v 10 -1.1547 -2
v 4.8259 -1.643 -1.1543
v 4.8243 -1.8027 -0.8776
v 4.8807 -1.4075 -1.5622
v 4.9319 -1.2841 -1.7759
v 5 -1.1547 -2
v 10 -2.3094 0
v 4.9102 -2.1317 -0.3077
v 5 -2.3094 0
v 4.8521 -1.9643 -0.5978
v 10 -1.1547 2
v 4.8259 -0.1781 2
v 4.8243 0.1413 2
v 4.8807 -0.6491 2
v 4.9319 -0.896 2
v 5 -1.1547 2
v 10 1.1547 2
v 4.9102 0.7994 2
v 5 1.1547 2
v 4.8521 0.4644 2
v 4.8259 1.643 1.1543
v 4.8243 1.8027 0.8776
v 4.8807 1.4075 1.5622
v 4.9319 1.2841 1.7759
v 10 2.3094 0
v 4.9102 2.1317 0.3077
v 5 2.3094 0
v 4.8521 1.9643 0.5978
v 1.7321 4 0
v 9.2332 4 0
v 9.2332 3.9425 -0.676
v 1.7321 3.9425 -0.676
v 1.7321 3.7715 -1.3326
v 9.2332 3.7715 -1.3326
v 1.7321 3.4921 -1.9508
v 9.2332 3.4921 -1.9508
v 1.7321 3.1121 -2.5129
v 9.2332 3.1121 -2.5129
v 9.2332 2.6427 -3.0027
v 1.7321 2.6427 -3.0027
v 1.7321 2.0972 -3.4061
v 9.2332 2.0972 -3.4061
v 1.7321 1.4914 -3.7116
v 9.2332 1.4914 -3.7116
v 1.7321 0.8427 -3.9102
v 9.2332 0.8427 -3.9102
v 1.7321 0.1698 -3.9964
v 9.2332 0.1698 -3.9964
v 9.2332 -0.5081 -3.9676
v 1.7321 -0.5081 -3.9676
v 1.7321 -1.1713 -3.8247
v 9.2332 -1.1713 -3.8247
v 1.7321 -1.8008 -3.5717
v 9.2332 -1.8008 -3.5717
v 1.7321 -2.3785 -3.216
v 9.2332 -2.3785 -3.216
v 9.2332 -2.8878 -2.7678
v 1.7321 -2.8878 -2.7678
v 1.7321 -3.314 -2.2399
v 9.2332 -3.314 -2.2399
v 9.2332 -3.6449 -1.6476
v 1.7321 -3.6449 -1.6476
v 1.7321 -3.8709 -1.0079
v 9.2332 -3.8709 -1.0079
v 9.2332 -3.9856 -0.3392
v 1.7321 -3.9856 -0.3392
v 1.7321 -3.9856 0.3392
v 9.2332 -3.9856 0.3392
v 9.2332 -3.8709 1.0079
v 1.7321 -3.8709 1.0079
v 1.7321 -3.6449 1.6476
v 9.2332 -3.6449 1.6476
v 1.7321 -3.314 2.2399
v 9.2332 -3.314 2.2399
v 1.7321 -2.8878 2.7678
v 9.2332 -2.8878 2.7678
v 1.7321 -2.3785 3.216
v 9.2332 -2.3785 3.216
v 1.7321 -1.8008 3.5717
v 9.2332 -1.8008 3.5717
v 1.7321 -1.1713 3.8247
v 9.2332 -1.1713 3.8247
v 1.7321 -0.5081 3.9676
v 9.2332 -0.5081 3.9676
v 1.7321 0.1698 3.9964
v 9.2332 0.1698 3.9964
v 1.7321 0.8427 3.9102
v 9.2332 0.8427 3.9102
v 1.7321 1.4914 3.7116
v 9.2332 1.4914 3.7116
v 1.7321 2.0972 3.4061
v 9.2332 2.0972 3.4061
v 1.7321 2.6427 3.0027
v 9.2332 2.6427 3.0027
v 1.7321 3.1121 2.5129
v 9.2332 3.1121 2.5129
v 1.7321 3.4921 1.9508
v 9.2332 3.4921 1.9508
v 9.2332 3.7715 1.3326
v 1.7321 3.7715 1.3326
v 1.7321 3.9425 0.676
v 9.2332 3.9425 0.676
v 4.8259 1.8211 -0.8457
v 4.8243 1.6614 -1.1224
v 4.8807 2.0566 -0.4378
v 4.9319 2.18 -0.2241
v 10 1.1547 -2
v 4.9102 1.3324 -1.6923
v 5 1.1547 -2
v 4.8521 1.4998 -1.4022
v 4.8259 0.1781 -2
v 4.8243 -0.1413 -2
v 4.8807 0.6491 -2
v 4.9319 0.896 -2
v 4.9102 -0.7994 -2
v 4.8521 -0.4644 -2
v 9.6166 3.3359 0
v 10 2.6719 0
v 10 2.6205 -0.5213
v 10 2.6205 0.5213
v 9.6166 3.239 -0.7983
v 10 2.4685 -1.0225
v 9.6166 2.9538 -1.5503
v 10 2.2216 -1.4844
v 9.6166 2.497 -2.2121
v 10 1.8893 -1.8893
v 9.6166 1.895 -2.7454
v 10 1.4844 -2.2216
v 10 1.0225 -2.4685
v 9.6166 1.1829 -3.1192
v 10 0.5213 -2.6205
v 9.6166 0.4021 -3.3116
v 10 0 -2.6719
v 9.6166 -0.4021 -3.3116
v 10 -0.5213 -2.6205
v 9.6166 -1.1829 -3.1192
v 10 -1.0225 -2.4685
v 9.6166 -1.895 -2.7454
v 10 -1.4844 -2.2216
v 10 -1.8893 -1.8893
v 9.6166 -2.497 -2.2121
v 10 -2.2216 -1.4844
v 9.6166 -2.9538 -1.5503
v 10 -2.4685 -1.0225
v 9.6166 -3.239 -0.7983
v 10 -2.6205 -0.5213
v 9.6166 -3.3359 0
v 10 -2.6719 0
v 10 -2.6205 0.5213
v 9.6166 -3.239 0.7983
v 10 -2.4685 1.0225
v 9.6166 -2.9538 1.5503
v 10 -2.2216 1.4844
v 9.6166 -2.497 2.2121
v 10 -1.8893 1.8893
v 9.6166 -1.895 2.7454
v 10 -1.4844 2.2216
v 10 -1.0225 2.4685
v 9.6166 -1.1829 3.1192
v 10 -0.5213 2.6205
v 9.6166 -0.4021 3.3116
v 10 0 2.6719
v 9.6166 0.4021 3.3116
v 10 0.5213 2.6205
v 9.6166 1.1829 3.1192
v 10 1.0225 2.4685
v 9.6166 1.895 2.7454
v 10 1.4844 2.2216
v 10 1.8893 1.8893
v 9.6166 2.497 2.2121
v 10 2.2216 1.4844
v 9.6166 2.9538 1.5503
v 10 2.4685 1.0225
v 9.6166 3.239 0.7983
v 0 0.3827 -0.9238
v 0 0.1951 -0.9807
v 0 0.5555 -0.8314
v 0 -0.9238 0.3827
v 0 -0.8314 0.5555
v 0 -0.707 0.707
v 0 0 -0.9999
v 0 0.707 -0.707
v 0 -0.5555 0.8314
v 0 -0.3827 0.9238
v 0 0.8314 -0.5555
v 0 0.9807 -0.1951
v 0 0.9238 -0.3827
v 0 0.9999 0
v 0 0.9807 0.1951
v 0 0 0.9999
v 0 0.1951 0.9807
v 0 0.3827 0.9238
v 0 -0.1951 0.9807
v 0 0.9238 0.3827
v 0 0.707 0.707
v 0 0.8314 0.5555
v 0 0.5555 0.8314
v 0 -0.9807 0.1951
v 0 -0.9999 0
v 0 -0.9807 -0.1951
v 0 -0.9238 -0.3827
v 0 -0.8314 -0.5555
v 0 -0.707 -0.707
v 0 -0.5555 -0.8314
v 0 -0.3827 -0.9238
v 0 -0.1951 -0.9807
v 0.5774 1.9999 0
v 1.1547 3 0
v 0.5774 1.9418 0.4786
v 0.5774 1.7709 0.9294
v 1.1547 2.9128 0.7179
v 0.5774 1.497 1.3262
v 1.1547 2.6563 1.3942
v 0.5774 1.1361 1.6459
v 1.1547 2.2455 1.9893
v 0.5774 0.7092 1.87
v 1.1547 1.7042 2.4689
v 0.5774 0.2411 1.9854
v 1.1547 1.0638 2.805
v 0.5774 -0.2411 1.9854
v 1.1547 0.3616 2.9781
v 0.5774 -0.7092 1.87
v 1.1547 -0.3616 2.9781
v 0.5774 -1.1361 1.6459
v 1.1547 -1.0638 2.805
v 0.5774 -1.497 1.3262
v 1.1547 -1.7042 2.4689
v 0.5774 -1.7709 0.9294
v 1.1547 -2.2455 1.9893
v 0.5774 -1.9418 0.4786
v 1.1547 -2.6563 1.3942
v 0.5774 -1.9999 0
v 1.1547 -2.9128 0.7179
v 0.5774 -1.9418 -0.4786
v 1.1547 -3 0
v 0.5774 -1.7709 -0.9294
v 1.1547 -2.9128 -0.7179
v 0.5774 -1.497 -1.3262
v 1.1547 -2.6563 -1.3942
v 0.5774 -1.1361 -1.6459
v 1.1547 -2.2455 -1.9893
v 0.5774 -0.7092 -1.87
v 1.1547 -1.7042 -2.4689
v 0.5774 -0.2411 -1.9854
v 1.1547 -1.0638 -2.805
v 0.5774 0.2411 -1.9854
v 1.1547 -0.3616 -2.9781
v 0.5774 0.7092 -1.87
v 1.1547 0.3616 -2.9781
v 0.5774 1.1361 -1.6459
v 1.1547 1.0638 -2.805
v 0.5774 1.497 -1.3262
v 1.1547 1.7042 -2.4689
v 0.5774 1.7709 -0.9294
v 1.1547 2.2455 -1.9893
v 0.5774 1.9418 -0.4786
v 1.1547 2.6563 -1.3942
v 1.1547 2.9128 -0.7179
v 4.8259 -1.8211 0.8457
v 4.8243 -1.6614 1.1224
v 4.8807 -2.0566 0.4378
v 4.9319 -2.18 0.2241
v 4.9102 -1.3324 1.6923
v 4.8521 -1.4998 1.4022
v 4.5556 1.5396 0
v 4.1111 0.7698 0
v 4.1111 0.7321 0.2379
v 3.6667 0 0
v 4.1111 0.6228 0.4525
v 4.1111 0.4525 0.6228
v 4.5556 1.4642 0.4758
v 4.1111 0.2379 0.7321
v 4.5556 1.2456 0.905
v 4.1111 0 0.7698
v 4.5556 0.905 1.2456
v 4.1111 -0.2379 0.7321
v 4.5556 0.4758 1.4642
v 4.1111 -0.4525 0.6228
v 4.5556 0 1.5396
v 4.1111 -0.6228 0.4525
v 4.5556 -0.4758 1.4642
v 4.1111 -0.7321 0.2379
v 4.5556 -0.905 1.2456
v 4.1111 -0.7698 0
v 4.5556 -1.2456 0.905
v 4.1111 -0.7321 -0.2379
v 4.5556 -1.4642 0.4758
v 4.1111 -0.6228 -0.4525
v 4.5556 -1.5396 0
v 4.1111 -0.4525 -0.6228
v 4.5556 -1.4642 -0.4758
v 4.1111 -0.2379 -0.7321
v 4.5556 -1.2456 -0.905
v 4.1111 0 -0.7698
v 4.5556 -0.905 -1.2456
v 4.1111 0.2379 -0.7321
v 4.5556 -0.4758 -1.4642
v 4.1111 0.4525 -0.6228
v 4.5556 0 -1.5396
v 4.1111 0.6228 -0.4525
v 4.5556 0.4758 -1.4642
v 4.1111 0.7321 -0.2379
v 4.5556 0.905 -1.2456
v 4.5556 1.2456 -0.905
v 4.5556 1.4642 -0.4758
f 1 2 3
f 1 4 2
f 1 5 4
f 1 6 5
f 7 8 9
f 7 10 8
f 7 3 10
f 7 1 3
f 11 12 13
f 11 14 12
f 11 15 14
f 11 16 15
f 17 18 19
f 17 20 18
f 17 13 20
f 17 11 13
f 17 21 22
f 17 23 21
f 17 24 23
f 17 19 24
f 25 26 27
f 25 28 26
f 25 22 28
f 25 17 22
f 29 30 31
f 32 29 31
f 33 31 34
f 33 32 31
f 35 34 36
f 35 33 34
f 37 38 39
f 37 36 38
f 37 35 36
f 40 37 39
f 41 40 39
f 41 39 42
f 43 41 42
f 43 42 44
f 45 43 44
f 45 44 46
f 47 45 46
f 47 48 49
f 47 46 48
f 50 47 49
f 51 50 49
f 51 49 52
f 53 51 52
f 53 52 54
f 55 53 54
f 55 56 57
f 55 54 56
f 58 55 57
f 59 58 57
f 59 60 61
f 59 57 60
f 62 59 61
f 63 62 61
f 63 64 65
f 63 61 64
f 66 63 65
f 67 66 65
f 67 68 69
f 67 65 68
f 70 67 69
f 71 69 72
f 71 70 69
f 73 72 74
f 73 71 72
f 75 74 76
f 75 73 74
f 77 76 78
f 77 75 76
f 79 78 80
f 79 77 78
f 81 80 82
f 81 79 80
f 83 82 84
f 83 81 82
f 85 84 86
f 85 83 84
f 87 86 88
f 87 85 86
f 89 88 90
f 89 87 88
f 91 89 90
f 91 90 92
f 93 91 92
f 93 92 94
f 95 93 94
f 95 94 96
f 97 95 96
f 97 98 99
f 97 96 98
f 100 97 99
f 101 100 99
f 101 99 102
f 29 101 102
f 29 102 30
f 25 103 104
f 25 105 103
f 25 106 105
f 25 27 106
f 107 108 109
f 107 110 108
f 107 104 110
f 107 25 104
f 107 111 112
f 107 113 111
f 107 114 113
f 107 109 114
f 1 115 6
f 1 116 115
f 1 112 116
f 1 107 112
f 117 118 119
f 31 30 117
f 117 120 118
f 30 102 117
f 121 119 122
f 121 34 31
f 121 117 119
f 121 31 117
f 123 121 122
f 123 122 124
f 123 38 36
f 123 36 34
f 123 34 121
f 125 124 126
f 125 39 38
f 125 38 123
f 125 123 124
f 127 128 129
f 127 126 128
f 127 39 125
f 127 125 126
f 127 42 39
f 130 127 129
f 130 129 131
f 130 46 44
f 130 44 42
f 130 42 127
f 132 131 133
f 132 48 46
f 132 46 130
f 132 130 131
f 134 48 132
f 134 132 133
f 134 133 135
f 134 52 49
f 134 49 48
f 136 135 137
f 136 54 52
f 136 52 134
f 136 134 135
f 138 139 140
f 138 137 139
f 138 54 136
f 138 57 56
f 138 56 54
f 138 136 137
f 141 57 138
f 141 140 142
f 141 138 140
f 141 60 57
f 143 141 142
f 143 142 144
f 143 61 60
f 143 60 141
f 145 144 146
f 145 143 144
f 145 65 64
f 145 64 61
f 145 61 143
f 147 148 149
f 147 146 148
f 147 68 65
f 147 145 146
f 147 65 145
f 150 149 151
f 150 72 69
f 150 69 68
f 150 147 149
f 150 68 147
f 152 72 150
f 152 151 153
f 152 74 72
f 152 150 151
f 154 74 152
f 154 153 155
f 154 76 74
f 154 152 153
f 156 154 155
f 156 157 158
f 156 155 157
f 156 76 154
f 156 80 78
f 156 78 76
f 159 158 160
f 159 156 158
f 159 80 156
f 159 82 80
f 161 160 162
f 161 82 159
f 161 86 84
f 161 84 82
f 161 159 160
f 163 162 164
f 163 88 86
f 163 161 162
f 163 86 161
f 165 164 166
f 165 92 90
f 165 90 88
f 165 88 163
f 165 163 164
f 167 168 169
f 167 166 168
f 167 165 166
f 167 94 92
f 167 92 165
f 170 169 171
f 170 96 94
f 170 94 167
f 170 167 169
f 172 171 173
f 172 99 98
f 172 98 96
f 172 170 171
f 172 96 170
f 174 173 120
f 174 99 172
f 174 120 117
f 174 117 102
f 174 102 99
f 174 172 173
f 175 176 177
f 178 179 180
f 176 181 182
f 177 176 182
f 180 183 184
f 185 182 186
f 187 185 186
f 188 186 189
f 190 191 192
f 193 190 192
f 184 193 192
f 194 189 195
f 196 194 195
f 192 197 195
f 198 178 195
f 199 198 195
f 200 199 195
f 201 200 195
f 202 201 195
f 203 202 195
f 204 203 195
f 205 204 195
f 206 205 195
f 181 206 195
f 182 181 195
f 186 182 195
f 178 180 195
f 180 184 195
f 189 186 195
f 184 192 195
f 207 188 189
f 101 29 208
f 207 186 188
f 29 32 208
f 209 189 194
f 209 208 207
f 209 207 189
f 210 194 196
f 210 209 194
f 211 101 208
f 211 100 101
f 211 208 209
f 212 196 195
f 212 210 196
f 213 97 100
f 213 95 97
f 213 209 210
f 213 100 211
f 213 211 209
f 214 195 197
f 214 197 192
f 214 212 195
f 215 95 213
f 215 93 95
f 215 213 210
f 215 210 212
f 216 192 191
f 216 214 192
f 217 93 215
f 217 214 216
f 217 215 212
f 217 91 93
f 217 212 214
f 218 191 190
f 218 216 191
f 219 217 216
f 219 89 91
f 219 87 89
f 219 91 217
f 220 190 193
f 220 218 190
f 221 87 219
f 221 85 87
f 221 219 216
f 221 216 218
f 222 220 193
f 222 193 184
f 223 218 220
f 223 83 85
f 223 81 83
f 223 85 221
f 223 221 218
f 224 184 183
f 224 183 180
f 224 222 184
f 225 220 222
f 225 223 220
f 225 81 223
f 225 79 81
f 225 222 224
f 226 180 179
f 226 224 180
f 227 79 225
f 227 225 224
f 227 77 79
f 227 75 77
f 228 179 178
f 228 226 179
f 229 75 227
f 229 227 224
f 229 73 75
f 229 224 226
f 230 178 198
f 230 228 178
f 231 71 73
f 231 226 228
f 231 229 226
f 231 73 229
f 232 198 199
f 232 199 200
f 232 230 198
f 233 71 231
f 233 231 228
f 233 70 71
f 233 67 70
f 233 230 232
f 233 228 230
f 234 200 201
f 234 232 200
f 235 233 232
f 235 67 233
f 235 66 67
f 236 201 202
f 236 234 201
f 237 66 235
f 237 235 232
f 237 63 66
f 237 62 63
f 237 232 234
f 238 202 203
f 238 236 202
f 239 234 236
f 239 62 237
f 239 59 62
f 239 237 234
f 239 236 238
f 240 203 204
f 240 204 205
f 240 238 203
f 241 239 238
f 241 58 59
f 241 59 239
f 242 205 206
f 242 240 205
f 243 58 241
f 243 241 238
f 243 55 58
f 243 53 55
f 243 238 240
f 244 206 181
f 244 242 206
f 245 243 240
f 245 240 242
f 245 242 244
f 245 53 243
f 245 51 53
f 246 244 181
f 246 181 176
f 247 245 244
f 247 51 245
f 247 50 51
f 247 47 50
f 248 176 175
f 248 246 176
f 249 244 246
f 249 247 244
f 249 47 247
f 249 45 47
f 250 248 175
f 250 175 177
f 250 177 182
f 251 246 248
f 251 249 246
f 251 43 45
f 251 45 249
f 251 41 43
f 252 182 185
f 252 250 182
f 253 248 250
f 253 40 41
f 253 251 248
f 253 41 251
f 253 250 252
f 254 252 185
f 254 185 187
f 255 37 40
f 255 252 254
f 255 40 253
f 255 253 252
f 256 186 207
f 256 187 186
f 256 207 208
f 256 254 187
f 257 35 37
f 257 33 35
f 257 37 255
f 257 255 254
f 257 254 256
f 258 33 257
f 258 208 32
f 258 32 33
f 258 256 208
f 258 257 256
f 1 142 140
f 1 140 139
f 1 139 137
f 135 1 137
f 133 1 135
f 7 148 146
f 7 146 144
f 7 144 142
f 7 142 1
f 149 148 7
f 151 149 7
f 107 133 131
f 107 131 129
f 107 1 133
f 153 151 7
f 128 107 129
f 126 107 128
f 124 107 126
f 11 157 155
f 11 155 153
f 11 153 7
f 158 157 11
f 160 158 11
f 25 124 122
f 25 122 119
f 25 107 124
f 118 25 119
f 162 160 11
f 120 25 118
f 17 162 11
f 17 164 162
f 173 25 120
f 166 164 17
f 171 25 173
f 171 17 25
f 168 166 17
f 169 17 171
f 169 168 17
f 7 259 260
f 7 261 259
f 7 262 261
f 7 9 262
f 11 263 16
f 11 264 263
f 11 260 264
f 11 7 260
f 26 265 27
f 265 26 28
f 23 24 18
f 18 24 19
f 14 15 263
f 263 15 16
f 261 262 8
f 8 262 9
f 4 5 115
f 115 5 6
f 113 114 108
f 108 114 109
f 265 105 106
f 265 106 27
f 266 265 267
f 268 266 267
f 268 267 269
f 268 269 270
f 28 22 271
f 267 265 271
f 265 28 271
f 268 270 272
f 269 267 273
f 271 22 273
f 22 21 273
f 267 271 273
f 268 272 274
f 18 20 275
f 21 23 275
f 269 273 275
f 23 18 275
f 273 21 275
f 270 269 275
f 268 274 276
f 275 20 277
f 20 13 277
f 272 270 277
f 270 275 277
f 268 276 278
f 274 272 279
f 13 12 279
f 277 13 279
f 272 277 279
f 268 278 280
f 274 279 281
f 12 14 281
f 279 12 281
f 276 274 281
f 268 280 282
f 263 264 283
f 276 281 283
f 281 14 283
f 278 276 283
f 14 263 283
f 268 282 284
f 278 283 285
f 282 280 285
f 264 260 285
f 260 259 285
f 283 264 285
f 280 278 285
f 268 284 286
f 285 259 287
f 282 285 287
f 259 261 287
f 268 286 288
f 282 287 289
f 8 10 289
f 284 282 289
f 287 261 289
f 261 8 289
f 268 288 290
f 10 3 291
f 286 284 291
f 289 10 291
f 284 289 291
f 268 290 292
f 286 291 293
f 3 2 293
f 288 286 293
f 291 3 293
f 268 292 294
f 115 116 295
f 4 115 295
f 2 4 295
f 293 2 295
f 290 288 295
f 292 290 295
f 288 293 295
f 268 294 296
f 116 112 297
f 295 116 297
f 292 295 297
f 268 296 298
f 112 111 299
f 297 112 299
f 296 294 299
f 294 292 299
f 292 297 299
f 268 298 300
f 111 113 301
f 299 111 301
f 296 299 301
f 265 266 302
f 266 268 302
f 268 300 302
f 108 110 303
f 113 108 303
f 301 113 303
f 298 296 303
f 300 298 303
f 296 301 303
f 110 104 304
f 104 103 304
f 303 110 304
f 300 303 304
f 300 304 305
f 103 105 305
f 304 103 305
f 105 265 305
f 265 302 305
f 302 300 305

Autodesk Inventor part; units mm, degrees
ref_plane "YZ Plane" through (0, 0, 0) normal (1, 0, 0) x (0, 1, 0)
ref_plane "XZ Plane" through (0, 0, 0) normal (0, 1, 0) x (-1, 0, 0)
sketch "Эскиз1" plane through (0, 0, 0) normal (0, 0, 1) x (1, 0, 0)
  line L0 (0, 0) -> (3.6667, 0)
  line L1 (10, 2.3094) -> (10, 4)
  line L2 (10, 4) -> (0, 4)
  line L3 (10, 2.3094) -> (5, 2.3094)
  line L4 (5, 2.3094) -> (3.6667, 0)
  line L5 (0, -0.8) -> (0, 4.8) projected
  line L6 (0, 4) -> (0, 0)
  dimension "d0" = 5
  dimension "d1" = 60
  dimension "d2" = 8
  dimension "d3" = 4.6188
  dimension "d5" = 10
revolve "Базовый элемент" add sketch "Эскиз1" angle 360 about axis through (0, 0, 0) along (1, 0, 0)
sketch "Эскиз2" plane through (10, 0, 0) normal (1, 0, 0) x (0, 1, 0)
  circle A0 centre (0, 0) radius 2.3094 projected
  line L0 (-1.1547, 2) -> (1.1547, 2)
  line L1 (1.1547, 2) -> (2.3094, 0)
  line L2 (2.3094, 0) -> (1.1547, -2)
  line L3 (1.1547, -2) -> (-1.1547, -2)
  line L4 (-1.1547, -2) -> (-2.3094, 0)
  line L5 (-2.3094, 0) -> (-1.1547, 2)
  point P0 (0, 0)
  point P1 (0, 0)
extrude "Паз" add sketch "Эскиз2" against normal up to next contours L1 A0 | A0 L2 | L0 A0 | A0 L3 | L5 A0 | A0 L4
thread "Резьба" size "M8x1.25" class "6g" standard "ISO Metric profile" length 10
chamfer "Фаска1" distance 1.7321 angle 60 1 edges at (0, -4, 0) measured on face at (6.6667, 3.987, -0.3219)
chamfer "Фаска2" distance 0.7668 angle 60 1 edges at (10, -4, 0) measured on face at (7.244, 3.9482, -0.6416)
ref_plane "Work Plane1" through (5, 0, 0) normal (0, 0, 1) x (1, 0, 0)
equation "\"d0\" = INTI"
equation "\"d2\" = NND"
equation "\"d3\" = 1.1547 * SW"
equation "\"d5\" = NLG"
equation "\"d12\" = NLG"
equation "\"d9\" = FAWI"
equation "\"d10\" = -0.5 * GD1 + 0.5 * NND"
equation "\"d11\" = FAWI"
equation "\"d35\" = -0.5 * GD1 + 0.5 * NND"
equation "\"NND\" = 8"
equation "\"NLG\" = 10"
equation "\"INTI\" = 5"
equation "\"FAWI\" = 60deg"
equation "\"SW\" = 4"
equation "\"GD1\" = THREADDIA - 1.2269 * PTC"
equation "\"FAWI1\" = 45deg"
equation "\"SPD\" = 2"
equation "\"GUL\" = 0.61345 * PTC"
equation "\"TOA\" = 30deg"
equation "\"THREADDIA\" = 8"
equation "\"PTC\" = 1.25"
equation "\"GAL\" = 0.61345 * PTC"
equation "\"E0\" = 1.155 * SW"
properties part number "AS 1421 - M8x10 конический" material "Сталь, мягкая"
